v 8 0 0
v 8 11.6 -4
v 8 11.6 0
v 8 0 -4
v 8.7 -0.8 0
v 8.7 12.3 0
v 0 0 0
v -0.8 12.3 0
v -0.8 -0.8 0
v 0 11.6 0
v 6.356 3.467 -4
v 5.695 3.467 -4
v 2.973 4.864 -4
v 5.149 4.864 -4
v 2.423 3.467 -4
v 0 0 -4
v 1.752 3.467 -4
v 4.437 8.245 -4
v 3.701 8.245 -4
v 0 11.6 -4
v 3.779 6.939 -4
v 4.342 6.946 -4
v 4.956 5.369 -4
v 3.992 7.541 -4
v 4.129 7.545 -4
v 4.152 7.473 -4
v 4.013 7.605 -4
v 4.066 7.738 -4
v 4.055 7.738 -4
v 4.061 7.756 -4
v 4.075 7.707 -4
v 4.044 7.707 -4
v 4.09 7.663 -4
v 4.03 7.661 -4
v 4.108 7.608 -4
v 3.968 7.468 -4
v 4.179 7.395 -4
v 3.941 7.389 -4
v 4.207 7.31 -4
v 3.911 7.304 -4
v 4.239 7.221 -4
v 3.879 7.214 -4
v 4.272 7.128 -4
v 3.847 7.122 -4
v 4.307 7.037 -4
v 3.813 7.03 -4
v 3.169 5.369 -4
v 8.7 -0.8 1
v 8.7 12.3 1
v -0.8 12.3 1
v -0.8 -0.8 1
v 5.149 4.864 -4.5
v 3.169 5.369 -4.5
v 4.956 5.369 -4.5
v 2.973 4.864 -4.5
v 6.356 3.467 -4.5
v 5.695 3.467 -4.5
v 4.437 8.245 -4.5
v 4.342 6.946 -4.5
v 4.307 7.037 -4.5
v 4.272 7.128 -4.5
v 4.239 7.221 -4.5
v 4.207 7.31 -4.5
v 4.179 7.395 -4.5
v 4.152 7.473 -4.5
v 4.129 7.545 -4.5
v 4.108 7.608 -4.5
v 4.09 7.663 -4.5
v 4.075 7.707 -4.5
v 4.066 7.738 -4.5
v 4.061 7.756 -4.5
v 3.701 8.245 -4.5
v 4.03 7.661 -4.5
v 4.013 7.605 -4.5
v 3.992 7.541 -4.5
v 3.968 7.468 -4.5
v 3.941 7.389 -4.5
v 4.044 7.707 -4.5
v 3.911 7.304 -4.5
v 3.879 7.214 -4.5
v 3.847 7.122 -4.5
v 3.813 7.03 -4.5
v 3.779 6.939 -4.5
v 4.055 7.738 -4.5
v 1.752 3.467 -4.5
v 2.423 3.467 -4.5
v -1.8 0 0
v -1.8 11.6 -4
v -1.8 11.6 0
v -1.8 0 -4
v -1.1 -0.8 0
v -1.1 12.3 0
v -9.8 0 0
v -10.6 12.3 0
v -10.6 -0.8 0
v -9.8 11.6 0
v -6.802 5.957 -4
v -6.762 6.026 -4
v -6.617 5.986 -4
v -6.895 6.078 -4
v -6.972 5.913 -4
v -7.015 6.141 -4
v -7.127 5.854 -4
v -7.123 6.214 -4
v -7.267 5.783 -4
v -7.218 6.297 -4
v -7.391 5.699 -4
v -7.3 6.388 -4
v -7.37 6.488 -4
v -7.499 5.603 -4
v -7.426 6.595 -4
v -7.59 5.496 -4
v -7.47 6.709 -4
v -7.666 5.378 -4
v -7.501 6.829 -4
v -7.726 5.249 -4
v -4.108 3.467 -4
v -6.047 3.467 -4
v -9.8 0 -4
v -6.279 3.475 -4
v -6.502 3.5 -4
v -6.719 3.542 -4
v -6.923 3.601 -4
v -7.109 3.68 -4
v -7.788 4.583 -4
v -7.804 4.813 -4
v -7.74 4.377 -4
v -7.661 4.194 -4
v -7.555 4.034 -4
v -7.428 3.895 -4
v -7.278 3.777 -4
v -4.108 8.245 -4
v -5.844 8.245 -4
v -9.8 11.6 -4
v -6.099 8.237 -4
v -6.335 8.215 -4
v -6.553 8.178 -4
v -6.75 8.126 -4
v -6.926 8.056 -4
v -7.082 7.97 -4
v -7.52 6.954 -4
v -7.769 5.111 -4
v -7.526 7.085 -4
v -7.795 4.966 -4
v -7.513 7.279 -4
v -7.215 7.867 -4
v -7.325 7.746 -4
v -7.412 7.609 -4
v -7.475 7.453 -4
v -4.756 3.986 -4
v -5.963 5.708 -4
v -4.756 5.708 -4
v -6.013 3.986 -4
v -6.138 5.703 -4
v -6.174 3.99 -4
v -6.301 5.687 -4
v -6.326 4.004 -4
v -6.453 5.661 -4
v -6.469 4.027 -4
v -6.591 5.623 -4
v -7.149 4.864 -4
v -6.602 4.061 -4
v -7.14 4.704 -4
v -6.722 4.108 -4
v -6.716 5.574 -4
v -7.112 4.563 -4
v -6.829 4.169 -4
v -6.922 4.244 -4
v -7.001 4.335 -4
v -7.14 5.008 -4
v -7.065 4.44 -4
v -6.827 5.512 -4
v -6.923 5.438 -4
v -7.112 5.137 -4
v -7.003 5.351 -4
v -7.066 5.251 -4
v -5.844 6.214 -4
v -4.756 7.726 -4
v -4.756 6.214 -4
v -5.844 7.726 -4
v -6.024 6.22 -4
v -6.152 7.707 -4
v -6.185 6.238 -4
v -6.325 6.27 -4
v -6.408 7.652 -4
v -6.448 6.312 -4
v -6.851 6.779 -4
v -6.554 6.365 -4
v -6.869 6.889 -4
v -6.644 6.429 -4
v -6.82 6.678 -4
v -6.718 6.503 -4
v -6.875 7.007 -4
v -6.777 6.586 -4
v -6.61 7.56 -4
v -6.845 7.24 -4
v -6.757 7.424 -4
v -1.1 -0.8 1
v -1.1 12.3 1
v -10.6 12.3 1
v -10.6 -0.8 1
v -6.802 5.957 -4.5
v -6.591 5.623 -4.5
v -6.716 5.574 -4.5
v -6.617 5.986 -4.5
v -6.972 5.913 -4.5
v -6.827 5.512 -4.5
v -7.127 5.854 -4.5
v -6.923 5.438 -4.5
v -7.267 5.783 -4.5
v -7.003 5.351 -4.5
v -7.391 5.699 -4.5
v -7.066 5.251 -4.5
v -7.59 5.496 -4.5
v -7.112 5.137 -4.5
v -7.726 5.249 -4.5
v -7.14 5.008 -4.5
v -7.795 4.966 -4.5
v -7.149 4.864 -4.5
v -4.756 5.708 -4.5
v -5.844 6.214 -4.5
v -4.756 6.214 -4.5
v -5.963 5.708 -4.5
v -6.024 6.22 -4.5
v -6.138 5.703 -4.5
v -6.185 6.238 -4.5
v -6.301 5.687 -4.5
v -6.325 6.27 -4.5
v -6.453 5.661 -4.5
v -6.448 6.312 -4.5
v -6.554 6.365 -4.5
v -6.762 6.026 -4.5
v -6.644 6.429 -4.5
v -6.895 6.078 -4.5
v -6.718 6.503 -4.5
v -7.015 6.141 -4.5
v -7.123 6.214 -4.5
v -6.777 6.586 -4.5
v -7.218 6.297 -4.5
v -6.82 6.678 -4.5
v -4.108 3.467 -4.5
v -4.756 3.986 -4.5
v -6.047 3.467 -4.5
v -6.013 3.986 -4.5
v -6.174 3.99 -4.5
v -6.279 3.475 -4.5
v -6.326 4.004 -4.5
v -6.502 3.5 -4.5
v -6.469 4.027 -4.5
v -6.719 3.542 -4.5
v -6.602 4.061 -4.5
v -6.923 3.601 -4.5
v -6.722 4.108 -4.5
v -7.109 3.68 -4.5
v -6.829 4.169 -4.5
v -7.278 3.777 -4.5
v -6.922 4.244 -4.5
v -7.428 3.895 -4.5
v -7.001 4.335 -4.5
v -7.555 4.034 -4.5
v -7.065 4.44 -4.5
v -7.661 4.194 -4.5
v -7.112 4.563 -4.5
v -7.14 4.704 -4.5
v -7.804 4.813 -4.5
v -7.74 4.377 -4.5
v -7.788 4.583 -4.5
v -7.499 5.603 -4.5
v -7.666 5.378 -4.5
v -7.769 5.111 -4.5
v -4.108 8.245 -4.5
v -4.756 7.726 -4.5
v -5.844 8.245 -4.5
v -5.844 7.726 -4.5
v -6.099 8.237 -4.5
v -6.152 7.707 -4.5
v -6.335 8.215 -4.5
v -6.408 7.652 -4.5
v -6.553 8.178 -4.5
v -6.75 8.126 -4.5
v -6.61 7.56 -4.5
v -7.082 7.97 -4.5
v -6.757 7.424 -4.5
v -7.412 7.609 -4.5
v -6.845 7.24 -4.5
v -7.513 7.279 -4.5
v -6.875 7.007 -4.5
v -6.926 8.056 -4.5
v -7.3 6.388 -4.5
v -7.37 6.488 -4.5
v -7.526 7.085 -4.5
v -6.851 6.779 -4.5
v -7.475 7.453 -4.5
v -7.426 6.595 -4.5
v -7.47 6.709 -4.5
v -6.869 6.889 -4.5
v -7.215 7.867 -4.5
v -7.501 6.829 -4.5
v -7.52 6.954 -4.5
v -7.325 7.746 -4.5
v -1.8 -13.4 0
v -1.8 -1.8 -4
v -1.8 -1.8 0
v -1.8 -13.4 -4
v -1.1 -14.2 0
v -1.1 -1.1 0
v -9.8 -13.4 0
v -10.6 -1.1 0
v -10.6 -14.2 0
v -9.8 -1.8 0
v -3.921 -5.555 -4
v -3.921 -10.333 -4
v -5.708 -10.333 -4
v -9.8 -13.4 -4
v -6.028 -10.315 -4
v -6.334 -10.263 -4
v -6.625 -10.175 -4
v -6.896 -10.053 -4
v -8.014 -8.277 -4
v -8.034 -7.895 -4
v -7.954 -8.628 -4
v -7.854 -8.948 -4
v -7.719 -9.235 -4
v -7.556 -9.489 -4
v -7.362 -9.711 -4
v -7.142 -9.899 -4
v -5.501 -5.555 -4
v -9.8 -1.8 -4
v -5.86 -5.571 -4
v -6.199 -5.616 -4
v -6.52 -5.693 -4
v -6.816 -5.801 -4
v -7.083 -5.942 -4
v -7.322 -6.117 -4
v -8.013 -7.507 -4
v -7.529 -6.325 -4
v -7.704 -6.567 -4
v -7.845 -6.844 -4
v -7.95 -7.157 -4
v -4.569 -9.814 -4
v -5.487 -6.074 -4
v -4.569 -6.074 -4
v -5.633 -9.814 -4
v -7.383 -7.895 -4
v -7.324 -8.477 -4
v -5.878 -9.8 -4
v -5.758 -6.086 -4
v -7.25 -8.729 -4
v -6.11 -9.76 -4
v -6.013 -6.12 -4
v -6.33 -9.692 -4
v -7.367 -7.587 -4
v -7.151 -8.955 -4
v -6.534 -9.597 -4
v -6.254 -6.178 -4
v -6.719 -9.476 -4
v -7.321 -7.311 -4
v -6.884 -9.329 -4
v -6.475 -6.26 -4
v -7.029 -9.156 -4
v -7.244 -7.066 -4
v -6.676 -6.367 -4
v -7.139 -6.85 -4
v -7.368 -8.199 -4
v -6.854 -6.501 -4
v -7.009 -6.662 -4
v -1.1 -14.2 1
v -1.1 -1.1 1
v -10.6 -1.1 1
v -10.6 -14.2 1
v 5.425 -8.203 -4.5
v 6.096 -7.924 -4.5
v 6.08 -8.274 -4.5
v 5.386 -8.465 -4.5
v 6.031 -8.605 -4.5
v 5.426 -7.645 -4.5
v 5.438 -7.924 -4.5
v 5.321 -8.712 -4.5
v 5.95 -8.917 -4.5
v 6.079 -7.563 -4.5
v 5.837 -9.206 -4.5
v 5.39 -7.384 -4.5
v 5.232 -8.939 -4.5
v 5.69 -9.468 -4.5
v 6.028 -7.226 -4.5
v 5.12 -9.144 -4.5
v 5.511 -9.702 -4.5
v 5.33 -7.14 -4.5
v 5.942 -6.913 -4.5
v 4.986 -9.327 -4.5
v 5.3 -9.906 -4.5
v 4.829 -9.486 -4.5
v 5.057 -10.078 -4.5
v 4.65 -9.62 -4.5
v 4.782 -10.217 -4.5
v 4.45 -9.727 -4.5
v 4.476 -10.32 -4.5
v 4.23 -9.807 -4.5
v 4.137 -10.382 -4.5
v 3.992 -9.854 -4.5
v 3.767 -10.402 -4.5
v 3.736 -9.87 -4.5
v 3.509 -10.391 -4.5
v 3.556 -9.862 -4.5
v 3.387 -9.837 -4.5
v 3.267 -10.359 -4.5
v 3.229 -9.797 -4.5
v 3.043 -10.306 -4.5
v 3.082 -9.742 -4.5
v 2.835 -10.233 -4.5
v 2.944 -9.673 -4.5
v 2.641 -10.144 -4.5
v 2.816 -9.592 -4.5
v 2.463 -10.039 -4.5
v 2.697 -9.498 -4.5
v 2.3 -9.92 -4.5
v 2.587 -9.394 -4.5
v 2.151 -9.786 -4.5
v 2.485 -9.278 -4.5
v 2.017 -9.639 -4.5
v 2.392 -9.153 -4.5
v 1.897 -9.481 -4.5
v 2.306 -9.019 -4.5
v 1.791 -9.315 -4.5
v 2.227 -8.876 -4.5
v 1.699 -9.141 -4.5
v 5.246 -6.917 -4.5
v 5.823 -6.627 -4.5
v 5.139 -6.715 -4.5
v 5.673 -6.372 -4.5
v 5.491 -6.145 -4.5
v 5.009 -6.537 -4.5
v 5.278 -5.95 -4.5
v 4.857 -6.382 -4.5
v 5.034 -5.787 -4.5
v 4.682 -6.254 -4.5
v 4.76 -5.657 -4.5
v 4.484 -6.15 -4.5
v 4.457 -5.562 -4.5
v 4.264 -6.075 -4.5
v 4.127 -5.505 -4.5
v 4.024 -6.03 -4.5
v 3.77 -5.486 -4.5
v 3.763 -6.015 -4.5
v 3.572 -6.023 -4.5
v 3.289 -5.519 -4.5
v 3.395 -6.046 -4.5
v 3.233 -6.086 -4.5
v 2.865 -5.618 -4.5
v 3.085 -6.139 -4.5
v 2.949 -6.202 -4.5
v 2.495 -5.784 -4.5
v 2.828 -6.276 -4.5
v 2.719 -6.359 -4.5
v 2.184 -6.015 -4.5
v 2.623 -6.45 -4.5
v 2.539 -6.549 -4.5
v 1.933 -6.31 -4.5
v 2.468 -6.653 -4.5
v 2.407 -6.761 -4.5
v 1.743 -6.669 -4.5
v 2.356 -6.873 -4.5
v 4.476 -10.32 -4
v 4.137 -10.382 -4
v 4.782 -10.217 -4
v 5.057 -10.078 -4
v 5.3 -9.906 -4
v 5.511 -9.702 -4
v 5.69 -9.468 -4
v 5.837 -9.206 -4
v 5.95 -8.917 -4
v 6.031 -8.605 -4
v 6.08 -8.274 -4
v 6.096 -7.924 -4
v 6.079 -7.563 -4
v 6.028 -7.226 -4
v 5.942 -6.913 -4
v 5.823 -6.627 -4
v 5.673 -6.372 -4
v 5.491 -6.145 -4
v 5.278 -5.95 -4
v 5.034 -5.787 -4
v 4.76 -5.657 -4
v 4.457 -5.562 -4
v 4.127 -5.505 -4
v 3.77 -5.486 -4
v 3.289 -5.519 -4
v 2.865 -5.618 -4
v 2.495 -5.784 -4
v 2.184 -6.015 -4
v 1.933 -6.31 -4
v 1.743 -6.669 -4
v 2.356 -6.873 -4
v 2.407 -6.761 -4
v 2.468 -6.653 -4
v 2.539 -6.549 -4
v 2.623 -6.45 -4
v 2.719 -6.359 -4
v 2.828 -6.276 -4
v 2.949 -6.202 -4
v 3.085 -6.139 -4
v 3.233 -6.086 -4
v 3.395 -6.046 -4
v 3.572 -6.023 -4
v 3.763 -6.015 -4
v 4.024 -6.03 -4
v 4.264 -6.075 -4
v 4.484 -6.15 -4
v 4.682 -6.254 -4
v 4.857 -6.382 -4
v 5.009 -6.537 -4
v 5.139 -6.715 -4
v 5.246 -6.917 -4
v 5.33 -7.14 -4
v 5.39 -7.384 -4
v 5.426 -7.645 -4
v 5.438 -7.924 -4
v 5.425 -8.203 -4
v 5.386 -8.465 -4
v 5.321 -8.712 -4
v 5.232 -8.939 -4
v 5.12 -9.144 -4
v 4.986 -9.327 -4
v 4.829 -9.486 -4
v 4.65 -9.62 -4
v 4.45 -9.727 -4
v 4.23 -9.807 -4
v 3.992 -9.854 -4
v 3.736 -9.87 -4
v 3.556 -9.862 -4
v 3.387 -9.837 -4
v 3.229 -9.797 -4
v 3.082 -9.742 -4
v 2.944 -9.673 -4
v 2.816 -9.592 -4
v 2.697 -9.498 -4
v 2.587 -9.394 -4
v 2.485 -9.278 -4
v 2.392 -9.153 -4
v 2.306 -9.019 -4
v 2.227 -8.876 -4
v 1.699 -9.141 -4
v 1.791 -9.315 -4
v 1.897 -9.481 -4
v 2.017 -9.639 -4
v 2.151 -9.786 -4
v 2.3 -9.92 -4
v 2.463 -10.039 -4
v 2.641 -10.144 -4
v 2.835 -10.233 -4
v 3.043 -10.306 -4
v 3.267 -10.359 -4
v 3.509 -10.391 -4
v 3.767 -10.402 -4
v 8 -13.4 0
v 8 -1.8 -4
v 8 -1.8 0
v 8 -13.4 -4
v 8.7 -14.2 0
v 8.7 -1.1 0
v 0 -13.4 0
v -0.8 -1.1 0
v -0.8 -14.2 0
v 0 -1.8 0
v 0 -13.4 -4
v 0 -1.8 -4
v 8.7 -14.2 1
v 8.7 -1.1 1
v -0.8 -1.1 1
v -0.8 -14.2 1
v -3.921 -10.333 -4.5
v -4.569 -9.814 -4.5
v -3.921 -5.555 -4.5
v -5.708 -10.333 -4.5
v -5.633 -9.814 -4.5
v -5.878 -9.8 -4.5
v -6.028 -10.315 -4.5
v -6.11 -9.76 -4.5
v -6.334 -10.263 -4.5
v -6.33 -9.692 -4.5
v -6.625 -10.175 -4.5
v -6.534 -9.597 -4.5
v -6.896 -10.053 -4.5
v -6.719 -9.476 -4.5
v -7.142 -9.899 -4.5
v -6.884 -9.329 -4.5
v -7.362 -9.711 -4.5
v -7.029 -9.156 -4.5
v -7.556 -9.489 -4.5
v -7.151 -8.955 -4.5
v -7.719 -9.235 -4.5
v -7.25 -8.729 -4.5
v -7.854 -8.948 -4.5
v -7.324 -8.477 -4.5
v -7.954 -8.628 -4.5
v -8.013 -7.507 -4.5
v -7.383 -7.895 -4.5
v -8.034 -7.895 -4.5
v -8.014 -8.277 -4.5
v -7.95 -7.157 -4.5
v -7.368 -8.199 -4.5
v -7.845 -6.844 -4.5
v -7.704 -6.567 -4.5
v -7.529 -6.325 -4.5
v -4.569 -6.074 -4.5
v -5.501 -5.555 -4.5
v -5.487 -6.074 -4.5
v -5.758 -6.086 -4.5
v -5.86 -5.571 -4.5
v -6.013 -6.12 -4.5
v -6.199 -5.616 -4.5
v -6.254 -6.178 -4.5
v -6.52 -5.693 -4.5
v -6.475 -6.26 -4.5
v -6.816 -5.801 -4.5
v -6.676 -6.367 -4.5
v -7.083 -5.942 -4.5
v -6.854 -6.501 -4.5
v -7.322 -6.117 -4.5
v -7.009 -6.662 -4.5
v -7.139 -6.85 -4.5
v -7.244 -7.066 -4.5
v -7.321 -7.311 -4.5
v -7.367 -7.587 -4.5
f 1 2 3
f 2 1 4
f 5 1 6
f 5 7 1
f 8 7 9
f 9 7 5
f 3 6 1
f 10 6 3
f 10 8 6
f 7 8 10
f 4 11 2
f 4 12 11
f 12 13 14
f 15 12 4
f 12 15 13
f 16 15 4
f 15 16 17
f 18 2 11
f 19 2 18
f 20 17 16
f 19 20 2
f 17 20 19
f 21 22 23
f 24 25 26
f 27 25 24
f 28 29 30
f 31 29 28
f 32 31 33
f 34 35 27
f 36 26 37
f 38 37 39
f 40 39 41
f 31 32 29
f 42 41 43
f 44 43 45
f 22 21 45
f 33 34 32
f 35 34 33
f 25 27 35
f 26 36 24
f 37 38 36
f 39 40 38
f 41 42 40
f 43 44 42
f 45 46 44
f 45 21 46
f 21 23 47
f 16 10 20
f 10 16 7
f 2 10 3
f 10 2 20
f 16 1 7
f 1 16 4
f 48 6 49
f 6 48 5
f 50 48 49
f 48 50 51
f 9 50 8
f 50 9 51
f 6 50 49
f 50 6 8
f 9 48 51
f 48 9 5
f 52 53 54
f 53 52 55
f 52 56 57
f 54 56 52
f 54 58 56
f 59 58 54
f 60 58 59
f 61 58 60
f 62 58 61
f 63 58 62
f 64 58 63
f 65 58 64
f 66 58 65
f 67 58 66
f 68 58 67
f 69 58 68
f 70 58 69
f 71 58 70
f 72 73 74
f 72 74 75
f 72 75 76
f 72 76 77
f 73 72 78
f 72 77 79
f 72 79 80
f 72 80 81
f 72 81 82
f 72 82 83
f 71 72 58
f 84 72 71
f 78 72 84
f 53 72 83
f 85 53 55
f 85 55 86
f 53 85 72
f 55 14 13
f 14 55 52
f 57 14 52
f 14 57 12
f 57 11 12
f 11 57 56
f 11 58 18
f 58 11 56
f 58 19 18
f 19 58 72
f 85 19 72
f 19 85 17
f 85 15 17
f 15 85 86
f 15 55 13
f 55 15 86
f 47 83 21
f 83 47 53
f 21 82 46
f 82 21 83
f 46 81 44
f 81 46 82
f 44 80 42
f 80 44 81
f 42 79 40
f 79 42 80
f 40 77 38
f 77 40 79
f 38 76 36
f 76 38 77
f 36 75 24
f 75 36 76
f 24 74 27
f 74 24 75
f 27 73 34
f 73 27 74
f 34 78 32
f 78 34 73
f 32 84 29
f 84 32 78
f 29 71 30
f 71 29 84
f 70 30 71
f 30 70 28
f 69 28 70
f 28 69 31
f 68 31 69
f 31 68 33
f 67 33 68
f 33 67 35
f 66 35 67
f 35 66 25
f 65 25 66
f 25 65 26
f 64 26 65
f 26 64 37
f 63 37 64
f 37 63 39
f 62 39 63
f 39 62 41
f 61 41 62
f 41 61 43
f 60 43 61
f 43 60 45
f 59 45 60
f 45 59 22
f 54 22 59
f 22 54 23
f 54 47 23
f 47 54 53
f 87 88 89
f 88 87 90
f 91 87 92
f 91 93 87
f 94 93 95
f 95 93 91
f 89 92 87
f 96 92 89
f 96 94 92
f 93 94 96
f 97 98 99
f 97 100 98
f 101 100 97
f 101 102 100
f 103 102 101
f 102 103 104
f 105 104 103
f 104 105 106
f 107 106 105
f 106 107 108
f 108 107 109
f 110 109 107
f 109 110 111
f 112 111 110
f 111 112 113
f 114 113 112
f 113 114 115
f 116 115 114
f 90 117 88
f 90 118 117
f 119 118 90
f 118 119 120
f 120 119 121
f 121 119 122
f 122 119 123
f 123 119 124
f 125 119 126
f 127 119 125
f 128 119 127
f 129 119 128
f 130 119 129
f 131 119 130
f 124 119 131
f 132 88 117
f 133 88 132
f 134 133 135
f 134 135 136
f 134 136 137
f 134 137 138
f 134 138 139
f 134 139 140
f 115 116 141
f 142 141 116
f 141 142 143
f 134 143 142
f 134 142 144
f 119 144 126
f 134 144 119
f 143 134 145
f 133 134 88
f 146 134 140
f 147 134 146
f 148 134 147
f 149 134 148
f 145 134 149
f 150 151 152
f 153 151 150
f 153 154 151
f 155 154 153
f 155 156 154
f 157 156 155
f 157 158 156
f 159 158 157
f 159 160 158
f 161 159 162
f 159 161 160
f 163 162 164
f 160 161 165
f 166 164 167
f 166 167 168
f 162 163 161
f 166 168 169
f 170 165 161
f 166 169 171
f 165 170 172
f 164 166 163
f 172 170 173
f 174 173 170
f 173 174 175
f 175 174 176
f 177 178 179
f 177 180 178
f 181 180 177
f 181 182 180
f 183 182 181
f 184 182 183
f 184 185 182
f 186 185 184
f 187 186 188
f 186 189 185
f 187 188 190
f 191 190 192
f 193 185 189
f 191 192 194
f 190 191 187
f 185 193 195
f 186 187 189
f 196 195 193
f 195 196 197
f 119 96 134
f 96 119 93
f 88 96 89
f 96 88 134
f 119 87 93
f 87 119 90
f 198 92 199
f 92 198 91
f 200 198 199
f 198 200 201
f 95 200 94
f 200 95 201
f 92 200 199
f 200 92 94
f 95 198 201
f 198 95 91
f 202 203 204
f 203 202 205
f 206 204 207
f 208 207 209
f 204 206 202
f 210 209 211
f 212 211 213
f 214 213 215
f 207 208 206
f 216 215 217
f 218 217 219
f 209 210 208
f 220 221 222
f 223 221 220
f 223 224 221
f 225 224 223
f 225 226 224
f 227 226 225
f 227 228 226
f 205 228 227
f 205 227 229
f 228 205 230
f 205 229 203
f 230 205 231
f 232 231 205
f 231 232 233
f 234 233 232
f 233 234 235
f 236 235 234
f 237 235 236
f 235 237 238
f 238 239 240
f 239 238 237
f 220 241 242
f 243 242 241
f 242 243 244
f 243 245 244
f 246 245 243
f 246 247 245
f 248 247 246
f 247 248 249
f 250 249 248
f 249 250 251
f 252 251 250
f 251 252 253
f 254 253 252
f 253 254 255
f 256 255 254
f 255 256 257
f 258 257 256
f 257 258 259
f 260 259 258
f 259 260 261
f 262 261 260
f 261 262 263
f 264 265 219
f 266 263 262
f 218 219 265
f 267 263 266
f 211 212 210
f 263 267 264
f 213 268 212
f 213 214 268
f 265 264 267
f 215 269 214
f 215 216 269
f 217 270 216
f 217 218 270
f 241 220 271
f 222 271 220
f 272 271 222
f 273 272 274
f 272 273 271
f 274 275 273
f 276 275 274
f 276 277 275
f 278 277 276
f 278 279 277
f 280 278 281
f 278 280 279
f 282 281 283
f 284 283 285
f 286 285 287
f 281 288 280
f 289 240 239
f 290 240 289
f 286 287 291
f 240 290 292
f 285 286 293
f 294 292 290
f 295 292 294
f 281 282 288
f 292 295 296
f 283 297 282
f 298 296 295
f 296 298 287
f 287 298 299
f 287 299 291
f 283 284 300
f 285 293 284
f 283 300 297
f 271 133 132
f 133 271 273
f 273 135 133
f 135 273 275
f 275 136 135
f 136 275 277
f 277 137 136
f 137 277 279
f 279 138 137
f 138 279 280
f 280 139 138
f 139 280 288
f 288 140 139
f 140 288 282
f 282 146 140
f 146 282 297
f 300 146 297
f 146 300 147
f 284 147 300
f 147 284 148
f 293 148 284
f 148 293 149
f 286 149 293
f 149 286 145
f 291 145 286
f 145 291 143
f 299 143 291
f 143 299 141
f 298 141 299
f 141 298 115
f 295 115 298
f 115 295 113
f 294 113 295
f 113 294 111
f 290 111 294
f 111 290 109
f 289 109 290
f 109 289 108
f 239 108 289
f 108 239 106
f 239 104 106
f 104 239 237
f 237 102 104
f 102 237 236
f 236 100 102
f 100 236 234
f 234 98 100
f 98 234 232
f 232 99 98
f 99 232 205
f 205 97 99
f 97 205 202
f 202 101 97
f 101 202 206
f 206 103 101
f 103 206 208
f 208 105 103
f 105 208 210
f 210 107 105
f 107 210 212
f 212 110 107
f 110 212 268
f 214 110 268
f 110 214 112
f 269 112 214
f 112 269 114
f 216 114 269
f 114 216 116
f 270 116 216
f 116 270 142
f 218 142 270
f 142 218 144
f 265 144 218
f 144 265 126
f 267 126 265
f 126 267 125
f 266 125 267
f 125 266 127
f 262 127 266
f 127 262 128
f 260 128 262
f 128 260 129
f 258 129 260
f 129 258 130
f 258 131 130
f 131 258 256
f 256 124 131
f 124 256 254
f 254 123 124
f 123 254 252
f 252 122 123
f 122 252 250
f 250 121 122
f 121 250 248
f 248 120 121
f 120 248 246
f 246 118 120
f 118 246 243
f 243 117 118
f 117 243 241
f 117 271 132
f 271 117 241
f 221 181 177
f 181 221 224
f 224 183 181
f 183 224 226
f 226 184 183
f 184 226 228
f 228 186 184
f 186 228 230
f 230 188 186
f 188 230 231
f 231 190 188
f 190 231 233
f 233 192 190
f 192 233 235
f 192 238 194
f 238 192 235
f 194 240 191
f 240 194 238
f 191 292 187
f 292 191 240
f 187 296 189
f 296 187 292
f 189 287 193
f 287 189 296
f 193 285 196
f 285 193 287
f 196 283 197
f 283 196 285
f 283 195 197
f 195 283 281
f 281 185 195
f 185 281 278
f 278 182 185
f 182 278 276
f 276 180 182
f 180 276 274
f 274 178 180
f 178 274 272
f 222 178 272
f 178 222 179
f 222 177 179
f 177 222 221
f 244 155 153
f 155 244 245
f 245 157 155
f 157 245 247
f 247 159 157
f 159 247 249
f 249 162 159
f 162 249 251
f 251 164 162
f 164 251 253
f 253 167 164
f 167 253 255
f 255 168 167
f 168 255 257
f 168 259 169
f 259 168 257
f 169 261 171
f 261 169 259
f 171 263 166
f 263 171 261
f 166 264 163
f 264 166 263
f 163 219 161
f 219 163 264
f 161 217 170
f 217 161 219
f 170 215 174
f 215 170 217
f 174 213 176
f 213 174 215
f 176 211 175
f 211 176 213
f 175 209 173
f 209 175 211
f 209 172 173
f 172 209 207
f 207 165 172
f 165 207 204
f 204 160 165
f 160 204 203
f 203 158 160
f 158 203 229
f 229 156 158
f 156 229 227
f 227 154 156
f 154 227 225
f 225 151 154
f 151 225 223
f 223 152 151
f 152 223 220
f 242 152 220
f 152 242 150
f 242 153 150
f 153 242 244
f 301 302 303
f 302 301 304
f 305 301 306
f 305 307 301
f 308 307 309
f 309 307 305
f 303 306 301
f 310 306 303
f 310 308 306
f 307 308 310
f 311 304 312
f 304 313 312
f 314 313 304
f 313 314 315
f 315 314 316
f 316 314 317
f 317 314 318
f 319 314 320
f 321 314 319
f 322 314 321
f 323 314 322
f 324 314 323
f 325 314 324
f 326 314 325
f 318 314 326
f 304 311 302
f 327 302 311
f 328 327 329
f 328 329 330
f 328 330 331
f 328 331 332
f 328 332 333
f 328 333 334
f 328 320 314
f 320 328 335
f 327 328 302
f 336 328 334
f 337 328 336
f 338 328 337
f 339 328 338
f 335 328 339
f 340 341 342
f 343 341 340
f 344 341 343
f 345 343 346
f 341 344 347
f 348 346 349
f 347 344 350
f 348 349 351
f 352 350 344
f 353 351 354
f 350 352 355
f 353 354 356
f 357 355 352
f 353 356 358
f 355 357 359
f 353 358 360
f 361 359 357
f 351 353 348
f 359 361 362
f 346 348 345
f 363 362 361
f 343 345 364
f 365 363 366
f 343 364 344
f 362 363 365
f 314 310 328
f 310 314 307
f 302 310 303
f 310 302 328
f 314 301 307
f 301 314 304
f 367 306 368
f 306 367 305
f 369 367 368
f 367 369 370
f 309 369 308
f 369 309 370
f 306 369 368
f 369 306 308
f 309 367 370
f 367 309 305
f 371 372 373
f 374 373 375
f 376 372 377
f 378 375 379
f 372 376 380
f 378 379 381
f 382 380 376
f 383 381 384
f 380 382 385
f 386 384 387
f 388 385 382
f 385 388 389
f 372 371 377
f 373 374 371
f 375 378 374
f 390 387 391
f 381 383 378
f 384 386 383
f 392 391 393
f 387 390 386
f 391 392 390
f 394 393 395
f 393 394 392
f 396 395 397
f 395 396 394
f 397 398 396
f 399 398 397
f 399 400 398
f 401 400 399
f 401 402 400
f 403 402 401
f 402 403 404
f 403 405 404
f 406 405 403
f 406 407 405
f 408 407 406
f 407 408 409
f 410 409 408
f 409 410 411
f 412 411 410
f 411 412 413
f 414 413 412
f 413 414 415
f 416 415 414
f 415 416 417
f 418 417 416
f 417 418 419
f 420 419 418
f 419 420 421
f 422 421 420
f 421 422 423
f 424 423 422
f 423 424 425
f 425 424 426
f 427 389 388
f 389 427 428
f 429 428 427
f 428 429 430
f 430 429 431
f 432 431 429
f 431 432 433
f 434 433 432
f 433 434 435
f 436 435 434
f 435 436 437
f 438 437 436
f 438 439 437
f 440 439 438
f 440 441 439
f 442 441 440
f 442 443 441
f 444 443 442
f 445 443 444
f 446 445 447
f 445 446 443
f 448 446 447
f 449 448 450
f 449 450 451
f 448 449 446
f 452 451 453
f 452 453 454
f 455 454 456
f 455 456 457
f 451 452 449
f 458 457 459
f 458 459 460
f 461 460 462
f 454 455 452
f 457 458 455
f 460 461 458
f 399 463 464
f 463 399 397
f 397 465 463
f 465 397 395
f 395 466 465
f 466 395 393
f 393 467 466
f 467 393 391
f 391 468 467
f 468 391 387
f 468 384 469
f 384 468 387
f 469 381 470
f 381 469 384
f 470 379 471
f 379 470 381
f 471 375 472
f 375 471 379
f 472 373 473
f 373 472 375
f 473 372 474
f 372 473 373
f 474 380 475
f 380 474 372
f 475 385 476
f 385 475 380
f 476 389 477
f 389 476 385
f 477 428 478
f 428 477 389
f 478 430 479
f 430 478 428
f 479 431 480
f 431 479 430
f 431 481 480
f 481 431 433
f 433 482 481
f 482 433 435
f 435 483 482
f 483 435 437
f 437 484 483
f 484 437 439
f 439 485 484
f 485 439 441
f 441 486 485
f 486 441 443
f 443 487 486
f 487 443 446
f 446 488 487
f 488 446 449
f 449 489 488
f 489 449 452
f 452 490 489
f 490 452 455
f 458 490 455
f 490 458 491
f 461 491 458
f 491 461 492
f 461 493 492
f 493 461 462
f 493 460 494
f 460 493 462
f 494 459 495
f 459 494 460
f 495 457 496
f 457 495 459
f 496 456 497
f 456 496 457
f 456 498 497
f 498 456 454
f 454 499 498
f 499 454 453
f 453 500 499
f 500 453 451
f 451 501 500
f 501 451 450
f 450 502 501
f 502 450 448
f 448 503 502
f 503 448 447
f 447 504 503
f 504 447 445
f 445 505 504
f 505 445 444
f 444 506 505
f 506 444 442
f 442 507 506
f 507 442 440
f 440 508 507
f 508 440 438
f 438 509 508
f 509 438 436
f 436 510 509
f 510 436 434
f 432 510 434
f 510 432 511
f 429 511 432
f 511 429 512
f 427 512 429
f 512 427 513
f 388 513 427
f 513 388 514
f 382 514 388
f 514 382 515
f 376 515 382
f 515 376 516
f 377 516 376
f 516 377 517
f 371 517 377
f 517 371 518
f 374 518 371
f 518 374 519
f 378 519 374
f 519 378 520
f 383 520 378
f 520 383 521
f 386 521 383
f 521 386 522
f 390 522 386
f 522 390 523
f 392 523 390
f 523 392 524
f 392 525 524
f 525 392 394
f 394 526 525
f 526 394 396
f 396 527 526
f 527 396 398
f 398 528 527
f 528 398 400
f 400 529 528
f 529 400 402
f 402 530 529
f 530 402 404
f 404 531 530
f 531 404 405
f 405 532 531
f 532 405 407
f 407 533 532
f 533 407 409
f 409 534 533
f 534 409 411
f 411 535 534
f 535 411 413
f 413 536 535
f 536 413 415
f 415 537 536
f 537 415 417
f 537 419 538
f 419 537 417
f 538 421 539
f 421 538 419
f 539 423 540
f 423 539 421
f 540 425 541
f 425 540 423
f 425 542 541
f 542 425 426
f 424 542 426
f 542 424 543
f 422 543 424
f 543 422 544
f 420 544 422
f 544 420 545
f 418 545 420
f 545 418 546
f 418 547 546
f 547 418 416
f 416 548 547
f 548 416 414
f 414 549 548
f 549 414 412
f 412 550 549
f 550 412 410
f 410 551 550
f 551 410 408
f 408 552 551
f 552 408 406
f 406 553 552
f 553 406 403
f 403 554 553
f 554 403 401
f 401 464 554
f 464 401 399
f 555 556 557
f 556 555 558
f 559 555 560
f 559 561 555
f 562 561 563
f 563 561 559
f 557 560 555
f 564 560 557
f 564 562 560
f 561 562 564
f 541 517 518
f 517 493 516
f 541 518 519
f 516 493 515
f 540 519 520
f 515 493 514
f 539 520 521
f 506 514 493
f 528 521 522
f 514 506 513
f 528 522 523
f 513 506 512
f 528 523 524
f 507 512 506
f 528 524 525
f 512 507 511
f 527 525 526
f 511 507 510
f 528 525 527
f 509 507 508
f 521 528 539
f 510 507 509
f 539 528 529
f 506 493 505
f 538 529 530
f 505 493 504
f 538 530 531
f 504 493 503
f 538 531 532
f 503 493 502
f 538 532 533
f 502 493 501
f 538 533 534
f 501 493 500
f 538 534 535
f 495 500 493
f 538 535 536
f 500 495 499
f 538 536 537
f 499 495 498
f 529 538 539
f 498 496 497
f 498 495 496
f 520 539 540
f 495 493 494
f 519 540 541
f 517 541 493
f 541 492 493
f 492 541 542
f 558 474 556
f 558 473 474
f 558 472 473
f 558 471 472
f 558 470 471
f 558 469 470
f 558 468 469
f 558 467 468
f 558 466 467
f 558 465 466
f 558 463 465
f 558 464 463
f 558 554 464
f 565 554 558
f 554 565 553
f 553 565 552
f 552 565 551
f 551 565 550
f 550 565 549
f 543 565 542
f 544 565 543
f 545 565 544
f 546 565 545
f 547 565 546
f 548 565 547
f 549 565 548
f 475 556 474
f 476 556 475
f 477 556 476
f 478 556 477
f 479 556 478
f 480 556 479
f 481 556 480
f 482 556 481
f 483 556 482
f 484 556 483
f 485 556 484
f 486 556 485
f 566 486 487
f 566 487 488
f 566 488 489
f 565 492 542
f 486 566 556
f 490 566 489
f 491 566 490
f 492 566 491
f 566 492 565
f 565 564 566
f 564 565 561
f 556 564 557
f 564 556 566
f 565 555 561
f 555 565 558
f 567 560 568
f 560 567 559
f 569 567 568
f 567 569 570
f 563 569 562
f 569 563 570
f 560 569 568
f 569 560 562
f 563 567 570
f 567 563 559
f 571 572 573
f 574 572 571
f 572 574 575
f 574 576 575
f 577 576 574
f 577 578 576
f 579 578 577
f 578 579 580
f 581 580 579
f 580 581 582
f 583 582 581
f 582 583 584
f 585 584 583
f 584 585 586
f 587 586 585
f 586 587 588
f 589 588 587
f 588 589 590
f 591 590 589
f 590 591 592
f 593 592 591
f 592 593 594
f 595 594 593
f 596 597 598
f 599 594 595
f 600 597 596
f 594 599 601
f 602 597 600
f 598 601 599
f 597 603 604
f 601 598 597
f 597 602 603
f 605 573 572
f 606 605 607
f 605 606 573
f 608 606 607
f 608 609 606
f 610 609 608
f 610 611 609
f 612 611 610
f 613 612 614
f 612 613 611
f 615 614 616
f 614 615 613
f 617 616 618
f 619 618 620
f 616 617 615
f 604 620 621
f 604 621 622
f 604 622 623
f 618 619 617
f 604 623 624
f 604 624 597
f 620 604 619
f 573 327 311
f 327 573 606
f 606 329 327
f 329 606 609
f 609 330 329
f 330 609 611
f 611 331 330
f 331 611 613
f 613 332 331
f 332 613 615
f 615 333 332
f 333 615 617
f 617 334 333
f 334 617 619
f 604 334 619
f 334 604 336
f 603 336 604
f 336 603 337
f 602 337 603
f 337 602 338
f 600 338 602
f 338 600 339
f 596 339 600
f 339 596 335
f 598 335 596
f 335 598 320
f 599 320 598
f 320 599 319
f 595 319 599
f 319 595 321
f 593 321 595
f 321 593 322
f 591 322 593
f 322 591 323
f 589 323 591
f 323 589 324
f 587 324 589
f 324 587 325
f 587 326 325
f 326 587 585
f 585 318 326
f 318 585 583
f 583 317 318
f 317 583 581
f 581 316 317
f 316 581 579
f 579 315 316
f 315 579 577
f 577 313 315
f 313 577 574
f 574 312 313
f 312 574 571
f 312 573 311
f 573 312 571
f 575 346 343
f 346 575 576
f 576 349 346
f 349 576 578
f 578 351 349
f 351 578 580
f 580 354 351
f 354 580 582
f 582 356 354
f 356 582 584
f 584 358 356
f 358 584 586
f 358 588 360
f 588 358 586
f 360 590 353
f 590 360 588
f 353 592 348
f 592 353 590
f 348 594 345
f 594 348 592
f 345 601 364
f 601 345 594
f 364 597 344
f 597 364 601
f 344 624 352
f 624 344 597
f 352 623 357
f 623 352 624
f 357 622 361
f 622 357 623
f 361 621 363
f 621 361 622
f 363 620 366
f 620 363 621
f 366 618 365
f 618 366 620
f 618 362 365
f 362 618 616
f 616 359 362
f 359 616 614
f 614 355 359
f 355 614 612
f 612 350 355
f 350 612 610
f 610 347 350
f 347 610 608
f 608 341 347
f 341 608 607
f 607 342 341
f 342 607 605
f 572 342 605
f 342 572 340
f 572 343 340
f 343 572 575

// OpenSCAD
th=2;	// wall thickness




module buttons() {
    buttonLength=8;
    buttonWidth=11.6;

    union() {
        translate([0,0,-th*2]) cube([buttonLength,buttonWidth,th*2]);
        translate([-0.8,-0.8,0]) cube([buttonLength+1.5,buttonWidth+1.5,1]);
        translate([buttonLength/2,buttonWidth/2,-(th*2)-0.5]) color ([1,0,0]) linear_extrude(1) text("A", size=5,halign="center", valign="center", font="arial");
    }
    
    union() {
        translate([-(1.8+buttonLength),0,-th*2]) cube([buttonLength,buttonWidth,th*2]);
        translate([-(1.8+buttonLength)-0.8,-0.8,0]) cube([buttonLength+1.5,buttonWidth+1.5,1]);
        translate([-(buttonWidth/2),buttonWidth/2,-(th*2)-0.5]) color ([1,0,0]) linear_extrude(1) mirror([1,0,0]) text("B", size=5,halign="center", valign="center", font="arial");
    }
    
    union() {
        translate([-(1.8+buttonLength),-(buttonWidth+1.8),-th*2]) cube([buttonLength,buttonWidth,th*2]);
        translate([-(1.8+buttonLength)-0.8,-(buttonWidth+1.8)-0.8,0]) cube([buttonLength+1.5,buttonWidth+1.5,1]);
        translate([(buttonLength/2),-buttonLength,-(th*2)-0.5]) color ([1,0,0]) linear_extrude(1) mirror([1,0,0]) text("C", size=5,halign="center", valign="center", font="arial");
    }
    
    union() {
        translate([0,-(buttonWidth+1.8),-th*2]) cube([buttonLength,buttonWidth,th*2]);
        translate([-0.8,-(buttonWidth+1.8)-0.8,0]) cube([buttonLength+1.5,buttonWidth+1.5,1]);
        translate([-(buttonWidth/2),-buttonLength,-(th*2)-0.5]) color ([1,0,0]) linear_extrude(1) mirror([1,0,0]) text("D", size=5,halign="center", valign="center", font="arial");
    }
}
    


buttons();
